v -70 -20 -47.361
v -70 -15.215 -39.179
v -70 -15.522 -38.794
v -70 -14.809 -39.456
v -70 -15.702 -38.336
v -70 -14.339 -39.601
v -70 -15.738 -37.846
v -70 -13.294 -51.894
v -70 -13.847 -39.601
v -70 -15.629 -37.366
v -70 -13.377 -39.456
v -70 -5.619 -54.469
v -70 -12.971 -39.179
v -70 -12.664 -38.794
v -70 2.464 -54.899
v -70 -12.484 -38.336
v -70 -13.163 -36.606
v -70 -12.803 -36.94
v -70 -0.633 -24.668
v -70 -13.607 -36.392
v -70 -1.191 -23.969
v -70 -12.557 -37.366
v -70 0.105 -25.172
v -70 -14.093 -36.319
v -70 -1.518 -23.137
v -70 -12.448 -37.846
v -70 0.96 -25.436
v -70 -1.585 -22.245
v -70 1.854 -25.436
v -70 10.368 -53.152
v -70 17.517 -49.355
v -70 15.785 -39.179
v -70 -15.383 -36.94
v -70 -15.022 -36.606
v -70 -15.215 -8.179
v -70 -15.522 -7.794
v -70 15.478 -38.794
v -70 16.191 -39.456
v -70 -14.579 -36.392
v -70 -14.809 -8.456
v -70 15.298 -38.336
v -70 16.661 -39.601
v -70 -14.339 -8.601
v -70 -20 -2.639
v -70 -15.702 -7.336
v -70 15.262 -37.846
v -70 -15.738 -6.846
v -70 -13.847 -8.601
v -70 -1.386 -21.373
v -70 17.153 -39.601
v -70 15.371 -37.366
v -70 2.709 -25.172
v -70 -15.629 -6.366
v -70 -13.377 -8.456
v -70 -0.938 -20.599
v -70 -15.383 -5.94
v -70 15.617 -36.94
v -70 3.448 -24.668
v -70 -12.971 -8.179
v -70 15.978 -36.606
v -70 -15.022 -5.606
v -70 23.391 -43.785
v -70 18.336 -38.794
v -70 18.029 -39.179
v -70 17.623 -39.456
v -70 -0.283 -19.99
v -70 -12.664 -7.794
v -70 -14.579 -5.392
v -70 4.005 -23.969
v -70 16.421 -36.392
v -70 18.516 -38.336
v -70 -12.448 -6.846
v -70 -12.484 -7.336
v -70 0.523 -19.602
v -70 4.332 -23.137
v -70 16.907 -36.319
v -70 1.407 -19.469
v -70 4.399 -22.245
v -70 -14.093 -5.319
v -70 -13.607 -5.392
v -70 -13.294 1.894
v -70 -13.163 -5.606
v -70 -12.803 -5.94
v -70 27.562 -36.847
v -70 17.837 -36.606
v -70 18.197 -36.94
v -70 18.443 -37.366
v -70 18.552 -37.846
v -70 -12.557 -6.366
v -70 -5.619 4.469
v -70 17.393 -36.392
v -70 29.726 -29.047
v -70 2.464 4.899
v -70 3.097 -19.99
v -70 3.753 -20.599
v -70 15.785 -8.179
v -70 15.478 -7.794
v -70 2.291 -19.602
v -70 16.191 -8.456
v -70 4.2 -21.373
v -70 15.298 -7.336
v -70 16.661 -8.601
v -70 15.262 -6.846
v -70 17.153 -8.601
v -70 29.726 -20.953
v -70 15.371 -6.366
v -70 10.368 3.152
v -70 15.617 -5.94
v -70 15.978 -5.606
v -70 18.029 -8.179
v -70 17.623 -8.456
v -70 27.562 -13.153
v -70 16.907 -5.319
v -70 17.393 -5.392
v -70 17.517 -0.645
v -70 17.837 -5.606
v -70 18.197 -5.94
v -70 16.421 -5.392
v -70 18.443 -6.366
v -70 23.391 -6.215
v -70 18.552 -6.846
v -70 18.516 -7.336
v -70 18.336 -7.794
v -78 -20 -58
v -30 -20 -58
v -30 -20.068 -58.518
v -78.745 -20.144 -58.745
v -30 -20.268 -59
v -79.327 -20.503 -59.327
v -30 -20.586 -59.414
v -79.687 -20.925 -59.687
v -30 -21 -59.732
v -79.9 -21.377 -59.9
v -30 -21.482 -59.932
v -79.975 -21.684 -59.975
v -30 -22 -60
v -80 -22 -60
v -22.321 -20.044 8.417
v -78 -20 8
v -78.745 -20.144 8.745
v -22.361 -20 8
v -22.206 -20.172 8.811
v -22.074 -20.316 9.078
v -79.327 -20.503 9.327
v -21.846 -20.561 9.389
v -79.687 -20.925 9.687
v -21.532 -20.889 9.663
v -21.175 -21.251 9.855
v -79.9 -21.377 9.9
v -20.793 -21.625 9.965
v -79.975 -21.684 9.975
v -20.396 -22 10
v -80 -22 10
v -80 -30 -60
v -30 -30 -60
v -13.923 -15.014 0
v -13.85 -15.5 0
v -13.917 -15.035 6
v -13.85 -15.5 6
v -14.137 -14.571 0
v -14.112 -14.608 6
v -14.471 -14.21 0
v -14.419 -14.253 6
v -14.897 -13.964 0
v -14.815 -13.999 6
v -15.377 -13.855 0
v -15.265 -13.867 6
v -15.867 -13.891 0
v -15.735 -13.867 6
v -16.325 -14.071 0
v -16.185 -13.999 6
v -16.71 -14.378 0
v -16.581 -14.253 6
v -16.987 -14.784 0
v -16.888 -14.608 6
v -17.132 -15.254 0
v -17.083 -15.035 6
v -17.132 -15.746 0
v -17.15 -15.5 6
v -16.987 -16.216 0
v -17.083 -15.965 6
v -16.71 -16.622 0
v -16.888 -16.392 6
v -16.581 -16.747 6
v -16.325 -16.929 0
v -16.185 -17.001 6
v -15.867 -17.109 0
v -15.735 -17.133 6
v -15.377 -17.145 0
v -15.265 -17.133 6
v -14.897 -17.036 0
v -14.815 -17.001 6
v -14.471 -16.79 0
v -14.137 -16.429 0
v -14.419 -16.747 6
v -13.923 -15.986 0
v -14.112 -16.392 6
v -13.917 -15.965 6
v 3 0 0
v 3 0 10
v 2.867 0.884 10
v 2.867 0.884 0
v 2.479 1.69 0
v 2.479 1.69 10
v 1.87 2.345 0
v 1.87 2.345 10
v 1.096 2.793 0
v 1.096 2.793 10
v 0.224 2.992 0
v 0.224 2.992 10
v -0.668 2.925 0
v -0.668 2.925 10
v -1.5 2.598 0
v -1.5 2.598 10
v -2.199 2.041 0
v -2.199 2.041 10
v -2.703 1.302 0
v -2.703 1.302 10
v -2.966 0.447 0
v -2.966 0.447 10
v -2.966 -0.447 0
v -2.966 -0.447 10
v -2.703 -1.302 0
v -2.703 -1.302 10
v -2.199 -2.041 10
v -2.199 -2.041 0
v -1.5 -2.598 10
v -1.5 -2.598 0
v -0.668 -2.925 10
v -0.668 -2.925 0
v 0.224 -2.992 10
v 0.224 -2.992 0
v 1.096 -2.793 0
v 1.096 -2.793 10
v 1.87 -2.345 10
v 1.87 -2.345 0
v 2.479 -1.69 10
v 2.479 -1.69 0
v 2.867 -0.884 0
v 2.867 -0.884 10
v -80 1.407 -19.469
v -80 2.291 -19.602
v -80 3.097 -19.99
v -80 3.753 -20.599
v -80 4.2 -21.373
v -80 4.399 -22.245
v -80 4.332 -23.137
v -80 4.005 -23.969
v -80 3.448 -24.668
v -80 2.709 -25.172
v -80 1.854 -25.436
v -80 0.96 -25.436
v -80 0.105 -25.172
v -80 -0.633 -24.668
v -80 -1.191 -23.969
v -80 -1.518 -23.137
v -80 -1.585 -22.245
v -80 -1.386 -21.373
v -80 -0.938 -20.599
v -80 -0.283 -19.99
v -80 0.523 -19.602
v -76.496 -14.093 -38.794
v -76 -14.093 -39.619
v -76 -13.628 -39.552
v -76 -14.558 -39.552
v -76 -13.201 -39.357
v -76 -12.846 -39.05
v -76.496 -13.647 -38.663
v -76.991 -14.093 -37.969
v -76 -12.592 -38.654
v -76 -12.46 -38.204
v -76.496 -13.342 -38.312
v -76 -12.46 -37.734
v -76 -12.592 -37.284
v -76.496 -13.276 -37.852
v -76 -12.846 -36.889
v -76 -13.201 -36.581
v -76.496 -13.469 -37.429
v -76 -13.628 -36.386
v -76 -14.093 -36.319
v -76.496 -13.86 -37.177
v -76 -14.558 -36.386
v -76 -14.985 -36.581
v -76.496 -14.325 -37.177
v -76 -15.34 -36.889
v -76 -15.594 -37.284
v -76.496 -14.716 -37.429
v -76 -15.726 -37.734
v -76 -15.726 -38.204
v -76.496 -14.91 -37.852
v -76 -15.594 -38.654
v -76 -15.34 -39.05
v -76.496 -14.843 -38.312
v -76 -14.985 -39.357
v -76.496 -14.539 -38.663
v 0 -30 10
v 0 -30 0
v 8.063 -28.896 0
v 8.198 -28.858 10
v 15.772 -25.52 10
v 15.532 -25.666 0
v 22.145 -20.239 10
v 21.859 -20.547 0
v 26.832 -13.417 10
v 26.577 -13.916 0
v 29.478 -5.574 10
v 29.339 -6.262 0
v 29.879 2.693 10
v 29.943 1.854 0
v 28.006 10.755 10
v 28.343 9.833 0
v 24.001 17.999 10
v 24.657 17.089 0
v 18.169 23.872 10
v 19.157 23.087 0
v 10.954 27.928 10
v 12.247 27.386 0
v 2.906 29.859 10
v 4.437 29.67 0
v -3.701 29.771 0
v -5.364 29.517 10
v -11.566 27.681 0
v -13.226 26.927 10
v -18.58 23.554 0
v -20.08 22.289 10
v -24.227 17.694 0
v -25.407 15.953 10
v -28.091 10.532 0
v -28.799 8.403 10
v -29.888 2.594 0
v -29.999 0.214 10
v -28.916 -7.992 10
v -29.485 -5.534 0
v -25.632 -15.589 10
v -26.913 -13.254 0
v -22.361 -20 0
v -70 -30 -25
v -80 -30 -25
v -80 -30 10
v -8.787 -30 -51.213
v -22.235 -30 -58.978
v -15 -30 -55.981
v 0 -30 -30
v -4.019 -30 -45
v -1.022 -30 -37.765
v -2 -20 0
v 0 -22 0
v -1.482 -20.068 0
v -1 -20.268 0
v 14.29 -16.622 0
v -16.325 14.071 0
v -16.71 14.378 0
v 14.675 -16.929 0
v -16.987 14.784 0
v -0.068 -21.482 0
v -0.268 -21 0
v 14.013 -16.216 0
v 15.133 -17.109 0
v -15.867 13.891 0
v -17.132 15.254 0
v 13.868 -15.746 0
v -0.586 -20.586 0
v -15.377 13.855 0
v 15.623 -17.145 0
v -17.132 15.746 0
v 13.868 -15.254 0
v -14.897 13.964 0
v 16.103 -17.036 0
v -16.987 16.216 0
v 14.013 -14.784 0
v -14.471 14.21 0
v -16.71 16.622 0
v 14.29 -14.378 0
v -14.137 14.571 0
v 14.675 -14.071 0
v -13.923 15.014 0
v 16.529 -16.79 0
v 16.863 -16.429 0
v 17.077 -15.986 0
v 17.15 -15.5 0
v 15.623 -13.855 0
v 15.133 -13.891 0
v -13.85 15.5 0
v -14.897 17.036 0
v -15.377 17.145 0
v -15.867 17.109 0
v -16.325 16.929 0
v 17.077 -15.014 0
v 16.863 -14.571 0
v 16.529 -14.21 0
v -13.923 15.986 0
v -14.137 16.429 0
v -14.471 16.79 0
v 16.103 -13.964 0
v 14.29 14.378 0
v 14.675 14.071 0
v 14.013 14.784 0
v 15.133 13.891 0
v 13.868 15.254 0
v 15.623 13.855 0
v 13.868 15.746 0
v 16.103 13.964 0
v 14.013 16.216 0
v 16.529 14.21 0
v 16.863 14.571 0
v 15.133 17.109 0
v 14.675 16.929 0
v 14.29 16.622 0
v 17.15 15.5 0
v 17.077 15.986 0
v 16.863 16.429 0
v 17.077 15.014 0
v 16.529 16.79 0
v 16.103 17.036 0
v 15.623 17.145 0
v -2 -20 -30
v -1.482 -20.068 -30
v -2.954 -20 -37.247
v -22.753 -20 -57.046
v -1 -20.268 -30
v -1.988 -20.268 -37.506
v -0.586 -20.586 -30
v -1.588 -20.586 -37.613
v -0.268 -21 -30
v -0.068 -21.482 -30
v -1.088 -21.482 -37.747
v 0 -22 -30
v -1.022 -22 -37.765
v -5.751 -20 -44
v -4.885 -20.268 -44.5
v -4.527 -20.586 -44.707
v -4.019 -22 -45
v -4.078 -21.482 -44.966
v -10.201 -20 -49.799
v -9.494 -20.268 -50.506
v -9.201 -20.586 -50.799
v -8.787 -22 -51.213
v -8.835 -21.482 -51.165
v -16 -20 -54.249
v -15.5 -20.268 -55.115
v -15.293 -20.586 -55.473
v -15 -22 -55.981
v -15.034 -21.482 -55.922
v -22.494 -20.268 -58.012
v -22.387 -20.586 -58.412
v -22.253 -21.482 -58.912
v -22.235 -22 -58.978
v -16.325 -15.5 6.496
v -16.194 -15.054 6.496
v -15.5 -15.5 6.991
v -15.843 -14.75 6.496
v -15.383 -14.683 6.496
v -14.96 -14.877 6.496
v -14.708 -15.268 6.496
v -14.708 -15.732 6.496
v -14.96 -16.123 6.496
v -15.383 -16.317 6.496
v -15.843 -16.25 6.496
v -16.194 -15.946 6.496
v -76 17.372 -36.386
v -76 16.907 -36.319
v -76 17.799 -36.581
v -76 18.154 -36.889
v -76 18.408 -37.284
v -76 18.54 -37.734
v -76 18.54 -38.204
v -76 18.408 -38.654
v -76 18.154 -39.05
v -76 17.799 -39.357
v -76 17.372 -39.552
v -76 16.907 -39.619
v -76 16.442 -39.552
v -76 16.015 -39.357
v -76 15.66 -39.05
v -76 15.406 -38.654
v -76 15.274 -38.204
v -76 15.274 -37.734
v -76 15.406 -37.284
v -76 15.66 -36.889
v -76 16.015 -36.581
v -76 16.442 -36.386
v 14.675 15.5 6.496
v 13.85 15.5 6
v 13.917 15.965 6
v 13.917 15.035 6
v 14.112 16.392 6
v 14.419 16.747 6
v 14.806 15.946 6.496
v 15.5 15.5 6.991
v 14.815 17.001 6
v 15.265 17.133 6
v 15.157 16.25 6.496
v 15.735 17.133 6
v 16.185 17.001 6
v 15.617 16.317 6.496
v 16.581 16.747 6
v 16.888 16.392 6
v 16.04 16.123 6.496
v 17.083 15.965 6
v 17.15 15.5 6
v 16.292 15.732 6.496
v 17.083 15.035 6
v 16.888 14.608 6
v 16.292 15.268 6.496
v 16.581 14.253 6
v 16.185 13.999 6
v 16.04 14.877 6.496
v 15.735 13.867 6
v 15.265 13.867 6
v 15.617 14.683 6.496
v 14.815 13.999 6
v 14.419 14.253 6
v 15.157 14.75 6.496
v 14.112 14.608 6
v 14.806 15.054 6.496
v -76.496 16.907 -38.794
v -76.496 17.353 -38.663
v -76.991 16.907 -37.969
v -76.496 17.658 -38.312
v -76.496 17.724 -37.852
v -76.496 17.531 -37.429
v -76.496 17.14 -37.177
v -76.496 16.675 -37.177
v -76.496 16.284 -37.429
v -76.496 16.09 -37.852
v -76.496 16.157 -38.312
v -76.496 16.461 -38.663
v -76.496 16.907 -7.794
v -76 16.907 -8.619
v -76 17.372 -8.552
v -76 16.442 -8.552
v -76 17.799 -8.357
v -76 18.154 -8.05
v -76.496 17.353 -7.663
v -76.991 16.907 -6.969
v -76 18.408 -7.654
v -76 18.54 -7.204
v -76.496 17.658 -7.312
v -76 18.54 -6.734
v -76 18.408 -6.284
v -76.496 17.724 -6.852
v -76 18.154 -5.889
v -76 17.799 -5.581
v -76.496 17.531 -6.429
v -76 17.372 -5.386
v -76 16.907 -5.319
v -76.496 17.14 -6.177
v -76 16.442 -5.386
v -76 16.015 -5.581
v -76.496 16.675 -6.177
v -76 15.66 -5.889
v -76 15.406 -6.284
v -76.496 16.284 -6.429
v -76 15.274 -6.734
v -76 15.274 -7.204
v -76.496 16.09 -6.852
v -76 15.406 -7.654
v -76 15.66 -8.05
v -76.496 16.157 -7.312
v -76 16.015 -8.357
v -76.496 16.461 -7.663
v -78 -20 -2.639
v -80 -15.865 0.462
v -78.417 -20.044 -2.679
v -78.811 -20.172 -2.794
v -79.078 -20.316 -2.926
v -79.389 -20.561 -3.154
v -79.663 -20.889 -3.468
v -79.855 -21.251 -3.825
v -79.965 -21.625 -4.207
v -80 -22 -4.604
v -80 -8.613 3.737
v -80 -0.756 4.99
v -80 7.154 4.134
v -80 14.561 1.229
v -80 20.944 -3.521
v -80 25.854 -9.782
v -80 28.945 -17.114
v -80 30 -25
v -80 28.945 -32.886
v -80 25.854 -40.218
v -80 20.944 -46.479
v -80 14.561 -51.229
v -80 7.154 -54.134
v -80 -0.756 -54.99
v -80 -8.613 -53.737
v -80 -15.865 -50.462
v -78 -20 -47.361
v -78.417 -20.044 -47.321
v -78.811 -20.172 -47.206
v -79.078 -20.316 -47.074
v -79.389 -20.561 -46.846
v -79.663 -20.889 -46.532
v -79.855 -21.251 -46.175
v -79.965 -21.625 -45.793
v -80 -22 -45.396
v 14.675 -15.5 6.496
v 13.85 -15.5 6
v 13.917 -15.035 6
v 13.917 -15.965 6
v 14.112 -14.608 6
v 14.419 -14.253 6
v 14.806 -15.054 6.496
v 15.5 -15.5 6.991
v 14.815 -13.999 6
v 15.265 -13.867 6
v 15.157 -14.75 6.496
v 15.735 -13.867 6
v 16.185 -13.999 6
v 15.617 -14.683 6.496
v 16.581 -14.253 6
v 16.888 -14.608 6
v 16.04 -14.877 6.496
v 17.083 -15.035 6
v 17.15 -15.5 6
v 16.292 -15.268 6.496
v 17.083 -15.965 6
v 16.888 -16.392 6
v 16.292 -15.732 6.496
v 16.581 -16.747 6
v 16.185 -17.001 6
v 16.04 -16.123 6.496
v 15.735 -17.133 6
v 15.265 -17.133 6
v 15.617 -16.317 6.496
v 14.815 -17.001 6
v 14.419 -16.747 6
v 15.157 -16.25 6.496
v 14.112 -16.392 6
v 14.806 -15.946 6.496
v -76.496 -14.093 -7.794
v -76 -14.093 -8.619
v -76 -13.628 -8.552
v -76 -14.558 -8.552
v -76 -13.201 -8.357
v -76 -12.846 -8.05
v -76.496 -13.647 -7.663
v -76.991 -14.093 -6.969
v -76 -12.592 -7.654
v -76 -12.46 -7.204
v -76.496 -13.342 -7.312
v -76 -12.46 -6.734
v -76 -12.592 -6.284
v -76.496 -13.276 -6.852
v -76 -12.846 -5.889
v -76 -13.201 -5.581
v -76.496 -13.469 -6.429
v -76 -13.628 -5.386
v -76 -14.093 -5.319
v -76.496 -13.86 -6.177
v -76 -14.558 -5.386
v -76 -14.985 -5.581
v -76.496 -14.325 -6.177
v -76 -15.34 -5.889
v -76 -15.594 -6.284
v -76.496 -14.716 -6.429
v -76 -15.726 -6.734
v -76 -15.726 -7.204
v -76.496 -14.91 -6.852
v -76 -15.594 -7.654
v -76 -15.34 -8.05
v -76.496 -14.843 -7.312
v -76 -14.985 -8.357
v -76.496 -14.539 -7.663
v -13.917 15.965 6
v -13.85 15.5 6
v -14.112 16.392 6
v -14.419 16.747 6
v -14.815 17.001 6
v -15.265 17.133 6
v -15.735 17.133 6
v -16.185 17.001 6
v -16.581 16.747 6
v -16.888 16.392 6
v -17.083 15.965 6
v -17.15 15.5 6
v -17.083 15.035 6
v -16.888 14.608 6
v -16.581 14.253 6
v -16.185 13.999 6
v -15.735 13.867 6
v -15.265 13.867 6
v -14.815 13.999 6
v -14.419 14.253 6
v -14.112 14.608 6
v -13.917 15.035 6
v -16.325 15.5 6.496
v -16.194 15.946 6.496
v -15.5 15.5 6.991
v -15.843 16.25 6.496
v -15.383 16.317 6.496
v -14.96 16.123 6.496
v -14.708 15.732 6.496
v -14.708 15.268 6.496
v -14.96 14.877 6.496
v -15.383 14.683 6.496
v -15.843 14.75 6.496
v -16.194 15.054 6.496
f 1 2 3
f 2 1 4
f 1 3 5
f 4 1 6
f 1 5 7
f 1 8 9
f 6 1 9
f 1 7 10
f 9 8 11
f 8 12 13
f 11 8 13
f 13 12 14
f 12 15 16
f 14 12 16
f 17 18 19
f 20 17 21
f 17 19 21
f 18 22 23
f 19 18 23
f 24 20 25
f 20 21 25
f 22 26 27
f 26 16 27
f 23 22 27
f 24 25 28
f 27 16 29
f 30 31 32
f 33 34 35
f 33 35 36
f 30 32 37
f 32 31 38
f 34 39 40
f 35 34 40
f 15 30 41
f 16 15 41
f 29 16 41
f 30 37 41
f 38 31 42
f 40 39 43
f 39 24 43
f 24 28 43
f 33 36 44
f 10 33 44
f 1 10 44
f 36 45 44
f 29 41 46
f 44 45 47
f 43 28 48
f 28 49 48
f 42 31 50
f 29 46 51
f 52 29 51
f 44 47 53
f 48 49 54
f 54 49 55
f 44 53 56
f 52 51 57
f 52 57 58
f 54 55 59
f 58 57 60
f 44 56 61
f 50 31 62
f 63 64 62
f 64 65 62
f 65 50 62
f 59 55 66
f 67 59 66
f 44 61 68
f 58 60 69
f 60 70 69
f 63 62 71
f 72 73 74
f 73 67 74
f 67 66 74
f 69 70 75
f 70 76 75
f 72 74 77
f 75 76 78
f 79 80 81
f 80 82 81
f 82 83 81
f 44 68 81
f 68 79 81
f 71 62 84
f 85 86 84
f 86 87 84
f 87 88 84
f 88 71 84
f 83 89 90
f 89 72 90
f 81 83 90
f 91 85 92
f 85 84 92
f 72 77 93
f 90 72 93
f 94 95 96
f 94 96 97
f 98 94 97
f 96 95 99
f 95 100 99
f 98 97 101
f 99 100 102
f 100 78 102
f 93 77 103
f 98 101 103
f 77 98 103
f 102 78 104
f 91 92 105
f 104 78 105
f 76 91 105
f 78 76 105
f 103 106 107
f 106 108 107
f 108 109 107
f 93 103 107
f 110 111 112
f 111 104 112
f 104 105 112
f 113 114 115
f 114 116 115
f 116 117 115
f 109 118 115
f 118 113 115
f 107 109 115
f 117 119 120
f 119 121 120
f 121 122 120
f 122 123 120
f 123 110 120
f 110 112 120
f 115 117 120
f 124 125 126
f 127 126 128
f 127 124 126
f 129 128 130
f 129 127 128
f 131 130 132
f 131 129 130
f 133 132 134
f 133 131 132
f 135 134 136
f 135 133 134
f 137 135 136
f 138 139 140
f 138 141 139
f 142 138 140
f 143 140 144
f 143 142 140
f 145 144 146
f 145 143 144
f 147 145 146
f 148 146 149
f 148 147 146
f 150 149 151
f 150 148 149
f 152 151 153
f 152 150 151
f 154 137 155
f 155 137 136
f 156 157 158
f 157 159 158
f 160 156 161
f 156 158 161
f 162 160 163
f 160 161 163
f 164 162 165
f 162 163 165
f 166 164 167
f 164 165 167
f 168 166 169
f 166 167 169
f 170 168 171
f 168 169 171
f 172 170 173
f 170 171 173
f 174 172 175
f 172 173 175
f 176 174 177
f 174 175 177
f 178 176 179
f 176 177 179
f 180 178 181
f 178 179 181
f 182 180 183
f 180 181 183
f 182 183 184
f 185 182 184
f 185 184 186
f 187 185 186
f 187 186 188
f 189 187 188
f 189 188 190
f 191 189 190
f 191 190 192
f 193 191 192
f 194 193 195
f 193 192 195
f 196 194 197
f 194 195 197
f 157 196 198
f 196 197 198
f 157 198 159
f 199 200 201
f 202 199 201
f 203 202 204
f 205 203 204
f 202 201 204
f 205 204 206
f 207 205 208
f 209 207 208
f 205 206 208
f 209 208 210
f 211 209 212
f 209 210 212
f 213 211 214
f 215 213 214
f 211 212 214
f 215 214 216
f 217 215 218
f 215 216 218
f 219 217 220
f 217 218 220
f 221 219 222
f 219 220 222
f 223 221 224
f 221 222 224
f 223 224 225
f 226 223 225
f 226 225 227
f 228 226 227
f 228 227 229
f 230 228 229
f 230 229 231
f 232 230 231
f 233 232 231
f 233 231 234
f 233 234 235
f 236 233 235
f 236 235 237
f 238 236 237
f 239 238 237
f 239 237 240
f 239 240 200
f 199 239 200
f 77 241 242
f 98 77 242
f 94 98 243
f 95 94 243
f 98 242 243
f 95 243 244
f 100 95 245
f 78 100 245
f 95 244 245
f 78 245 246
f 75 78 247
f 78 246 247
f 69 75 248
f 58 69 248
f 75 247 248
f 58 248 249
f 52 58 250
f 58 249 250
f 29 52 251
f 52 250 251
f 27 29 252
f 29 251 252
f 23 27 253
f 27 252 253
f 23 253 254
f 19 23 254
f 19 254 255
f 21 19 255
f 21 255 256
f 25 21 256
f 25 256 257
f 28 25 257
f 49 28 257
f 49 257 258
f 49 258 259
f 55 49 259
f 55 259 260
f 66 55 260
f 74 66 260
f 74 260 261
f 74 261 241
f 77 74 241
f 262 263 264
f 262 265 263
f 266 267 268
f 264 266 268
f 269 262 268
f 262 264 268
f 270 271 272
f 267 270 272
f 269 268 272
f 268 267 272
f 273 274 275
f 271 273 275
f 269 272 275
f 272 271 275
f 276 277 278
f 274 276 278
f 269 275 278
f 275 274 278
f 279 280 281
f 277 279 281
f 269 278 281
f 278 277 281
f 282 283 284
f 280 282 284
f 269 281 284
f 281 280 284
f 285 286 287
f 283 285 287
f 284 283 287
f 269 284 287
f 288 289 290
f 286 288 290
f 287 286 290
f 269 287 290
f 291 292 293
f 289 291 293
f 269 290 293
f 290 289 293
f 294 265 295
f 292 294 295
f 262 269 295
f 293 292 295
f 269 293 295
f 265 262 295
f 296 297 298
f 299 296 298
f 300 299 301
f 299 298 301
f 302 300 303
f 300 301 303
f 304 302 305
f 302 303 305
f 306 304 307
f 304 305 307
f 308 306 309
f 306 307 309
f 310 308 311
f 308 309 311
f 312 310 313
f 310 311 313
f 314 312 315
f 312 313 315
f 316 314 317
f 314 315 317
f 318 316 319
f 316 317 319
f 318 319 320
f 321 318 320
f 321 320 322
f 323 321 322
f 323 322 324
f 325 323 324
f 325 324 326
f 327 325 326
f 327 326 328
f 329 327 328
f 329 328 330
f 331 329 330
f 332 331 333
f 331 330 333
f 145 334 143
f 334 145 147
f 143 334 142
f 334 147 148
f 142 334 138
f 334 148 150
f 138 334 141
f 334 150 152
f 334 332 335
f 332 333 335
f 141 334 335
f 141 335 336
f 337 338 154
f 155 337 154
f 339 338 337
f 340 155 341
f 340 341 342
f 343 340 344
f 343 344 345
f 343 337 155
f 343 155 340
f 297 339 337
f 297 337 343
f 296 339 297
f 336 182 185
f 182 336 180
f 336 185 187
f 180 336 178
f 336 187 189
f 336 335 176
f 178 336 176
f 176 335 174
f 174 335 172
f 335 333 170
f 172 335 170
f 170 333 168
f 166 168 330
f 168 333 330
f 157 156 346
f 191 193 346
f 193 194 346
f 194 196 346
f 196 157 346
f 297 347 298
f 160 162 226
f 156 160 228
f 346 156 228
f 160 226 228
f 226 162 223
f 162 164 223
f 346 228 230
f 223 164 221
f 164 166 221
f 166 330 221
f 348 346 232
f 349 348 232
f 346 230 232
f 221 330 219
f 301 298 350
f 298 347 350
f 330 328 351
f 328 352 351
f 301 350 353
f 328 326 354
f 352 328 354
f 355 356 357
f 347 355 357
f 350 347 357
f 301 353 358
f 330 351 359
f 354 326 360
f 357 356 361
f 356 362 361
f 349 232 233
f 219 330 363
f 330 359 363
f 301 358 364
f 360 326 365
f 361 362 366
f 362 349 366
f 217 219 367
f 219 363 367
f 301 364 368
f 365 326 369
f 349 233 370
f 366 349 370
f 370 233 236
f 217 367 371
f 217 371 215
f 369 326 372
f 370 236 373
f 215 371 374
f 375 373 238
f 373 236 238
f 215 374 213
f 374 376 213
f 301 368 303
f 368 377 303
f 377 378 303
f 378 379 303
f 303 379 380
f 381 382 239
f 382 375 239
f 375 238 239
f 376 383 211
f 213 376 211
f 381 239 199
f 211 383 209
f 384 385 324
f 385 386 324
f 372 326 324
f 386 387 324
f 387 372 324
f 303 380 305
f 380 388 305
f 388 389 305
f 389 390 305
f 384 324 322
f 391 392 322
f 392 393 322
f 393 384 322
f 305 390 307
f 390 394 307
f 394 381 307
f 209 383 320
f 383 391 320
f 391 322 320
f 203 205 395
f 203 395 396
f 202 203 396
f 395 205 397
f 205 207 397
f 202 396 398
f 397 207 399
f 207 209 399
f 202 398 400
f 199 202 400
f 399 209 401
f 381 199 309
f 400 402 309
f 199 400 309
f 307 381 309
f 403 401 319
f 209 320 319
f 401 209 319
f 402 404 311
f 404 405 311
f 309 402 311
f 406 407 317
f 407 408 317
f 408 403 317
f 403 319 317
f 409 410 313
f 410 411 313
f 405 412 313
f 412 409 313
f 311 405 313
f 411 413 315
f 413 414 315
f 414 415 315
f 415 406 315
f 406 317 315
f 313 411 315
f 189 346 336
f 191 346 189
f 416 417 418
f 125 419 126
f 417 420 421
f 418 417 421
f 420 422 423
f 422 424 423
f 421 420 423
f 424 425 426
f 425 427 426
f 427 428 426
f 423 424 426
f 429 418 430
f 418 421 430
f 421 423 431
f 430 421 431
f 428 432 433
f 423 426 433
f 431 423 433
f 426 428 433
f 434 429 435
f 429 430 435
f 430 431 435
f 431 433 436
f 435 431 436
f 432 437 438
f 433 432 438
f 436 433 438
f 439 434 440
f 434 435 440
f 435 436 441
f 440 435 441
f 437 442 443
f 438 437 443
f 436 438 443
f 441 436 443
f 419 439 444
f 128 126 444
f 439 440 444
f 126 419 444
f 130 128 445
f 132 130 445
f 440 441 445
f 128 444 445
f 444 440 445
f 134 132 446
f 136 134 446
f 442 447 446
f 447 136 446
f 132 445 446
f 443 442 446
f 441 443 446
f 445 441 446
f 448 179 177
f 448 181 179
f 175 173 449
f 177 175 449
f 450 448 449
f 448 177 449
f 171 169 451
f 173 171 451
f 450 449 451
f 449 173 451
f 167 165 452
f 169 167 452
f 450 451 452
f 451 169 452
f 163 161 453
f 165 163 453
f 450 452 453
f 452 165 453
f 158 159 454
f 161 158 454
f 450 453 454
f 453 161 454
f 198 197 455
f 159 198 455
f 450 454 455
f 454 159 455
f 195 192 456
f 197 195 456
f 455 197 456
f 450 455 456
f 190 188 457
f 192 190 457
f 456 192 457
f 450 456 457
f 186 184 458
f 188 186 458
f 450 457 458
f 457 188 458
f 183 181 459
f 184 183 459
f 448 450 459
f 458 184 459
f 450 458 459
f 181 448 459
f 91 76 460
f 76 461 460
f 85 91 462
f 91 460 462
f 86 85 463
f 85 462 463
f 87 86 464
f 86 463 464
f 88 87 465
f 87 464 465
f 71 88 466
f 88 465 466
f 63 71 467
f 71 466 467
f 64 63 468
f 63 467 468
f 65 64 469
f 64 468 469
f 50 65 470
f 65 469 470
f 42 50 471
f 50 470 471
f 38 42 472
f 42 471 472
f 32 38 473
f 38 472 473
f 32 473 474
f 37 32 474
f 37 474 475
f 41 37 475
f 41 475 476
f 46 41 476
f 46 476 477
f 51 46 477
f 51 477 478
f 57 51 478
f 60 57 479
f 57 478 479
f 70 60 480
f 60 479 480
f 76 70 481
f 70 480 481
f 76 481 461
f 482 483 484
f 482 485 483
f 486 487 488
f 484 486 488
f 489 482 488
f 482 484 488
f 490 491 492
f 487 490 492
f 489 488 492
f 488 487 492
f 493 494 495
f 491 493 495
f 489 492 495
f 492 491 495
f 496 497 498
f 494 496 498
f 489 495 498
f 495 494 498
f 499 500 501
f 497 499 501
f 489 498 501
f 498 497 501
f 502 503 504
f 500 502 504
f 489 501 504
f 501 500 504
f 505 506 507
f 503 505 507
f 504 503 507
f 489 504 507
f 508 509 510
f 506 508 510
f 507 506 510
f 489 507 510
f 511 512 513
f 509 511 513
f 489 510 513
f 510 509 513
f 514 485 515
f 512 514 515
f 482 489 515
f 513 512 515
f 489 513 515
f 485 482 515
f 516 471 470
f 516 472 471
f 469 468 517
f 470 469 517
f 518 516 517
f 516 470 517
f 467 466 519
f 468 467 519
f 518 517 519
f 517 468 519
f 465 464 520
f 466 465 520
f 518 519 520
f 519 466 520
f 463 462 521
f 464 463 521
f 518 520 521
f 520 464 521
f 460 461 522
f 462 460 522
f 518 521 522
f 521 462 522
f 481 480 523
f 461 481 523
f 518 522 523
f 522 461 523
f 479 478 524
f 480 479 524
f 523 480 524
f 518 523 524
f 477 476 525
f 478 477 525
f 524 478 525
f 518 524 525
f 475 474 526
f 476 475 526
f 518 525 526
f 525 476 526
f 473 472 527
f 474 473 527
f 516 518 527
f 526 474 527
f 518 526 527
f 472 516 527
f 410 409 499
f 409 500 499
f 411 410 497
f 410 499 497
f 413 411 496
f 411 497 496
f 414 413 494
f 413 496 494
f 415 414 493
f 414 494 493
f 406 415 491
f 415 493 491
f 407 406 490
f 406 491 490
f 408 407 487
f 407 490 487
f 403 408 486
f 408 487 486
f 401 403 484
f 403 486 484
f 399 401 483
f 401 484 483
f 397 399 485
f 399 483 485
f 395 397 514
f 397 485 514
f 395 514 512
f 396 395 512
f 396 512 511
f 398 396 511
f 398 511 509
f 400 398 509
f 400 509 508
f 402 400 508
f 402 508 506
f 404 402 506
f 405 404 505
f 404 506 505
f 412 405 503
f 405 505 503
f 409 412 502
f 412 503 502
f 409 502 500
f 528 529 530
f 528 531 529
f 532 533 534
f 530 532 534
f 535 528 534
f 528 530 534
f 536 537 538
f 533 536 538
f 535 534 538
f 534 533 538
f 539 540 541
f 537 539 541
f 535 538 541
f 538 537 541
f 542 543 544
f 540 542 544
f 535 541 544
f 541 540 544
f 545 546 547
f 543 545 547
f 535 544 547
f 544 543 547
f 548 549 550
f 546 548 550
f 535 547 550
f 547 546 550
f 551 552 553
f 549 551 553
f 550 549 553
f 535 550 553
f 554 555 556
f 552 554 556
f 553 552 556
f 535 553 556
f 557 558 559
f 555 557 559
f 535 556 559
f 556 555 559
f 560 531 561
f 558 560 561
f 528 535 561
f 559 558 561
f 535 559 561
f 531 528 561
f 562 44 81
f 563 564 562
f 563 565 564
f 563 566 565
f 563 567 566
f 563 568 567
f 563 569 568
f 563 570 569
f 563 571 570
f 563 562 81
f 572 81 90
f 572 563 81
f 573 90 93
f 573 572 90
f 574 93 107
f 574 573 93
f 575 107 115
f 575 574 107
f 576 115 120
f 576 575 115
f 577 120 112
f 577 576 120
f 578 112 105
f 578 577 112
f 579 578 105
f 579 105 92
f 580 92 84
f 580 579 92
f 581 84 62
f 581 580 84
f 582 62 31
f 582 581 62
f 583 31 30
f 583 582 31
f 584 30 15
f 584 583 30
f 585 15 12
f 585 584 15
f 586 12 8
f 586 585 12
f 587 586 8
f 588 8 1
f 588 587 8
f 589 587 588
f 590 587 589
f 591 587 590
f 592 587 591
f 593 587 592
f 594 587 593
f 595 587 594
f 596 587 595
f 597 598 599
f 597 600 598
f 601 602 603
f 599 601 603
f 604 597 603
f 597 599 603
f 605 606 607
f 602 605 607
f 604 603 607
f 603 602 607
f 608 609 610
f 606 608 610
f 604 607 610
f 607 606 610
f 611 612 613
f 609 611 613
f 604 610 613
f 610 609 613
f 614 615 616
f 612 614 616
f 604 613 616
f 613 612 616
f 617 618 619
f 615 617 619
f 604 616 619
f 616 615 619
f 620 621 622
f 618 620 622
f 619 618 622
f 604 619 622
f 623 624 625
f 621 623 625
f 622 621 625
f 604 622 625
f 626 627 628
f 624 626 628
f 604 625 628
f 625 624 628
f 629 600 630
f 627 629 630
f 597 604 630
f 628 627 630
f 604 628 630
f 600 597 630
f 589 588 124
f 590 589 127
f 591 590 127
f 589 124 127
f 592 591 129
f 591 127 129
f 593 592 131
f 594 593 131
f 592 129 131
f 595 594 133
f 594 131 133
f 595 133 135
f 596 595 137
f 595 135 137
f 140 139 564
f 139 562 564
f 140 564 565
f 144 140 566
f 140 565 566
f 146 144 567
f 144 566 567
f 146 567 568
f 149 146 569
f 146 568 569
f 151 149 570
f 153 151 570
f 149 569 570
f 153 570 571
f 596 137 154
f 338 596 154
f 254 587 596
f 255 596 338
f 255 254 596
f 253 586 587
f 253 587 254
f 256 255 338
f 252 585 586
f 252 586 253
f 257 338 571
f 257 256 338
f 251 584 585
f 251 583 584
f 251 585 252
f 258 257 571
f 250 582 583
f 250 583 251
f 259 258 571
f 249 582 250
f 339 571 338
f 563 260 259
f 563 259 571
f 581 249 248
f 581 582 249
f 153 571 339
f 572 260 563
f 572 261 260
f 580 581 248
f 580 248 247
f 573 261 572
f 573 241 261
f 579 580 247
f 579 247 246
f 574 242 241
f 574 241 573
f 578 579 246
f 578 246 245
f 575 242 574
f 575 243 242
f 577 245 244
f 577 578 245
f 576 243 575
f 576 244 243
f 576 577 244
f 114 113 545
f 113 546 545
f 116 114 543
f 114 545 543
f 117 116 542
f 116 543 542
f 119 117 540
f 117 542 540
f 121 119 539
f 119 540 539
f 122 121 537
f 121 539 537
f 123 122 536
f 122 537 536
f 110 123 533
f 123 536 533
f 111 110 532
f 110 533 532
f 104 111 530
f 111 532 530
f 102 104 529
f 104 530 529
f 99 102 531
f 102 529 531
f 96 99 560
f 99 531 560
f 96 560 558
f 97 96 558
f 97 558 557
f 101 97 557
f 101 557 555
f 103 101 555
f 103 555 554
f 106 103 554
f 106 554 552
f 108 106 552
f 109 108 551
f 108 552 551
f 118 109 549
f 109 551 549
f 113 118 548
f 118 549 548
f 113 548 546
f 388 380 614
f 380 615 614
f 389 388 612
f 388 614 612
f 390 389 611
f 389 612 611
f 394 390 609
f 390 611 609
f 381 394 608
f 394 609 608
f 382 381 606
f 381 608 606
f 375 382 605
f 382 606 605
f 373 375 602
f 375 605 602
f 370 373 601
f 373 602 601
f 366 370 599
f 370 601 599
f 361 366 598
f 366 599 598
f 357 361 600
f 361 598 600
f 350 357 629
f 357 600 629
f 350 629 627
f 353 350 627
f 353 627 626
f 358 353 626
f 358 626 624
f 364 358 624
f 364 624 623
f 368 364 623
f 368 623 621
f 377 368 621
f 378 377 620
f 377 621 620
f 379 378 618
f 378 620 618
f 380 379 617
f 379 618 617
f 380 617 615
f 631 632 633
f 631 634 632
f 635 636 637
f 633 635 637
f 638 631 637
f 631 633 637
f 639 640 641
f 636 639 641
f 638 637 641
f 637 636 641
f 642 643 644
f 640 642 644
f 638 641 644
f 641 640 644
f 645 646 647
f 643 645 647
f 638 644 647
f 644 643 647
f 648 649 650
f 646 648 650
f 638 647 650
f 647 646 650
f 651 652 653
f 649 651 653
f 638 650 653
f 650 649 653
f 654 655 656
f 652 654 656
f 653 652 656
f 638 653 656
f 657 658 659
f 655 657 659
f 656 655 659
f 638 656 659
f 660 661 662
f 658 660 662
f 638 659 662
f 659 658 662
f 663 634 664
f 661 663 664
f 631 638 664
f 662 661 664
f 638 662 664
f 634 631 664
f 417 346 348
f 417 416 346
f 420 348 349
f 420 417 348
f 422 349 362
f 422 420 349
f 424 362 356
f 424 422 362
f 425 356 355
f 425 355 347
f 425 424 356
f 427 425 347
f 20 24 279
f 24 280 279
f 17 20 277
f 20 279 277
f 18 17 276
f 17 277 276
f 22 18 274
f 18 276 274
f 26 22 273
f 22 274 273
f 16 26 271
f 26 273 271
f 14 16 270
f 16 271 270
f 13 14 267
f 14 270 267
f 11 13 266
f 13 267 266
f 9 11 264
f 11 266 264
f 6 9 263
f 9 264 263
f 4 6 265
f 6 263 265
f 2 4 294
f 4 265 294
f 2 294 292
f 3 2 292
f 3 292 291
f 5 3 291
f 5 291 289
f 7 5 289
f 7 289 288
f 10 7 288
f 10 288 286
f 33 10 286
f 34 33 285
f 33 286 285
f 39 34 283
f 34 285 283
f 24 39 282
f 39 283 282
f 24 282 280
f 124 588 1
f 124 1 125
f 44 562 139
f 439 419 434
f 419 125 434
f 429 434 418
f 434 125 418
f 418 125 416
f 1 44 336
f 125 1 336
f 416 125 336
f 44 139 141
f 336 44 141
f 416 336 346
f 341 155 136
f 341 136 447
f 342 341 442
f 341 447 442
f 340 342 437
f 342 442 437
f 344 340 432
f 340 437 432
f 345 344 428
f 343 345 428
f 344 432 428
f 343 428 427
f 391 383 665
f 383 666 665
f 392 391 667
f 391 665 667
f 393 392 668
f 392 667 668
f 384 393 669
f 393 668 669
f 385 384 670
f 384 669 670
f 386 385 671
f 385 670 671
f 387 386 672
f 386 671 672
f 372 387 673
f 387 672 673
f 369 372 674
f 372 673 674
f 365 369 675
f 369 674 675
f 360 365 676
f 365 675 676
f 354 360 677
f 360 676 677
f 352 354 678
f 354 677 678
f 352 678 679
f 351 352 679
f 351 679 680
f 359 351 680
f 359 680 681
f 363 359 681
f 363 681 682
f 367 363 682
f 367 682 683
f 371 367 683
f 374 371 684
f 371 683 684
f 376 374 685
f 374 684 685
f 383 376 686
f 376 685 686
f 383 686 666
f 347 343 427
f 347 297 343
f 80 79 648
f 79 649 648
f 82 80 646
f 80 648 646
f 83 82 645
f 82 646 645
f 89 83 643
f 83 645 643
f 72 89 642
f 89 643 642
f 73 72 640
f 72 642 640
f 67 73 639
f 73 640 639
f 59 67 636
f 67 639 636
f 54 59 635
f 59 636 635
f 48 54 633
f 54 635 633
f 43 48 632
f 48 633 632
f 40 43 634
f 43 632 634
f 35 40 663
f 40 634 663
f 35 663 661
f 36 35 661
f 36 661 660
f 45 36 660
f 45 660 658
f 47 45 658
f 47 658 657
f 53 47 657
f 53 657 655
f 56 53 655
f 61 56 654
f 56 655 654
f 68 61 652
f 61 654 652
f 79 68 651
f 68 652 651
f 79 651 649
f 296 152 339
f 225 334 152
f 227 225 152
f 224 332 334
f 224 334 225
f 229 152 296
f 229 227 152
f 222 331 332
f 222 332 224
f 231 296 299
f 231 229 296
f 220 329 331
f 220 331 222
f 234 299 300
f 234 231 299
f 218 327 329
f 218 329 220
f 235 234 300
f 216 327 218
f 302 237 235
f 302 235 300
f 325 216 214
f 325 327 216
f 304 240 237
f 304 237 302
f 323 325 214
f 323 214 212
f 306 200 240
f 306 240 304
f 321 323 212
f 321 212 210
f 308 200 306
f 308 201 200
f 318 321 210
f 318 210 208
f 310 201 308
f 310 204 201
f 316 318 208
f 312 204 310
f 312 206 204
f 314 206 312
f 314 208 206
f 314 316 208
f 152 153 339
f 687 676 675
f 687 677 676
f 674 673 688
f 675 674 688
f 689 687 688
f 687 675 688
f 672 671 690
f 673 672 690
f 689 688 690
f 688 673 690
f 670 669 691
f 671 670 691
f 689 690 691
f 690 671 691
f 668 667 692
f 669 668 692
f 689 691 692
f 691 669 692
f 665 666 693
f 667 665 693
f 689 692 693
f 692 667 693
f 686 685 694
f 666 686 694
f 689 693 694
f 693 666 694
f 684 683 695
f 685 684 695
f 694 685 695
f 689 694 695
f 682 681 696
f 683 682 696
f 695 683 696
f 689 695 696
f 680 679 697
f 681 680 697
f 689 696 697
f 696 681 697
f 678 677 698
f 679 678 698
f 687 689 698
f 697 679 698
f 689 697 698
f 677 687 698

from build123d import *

# Parameters (mm, degrees)
SKETCH1_R                 = 30
BOSS_EXTRUDE1_DEPTH       = 10
SKETCH2_W                 = 80
SKETCH2_H                 = 10
BOSS_EXTRUDE2_DEPTH       = 70
SKETCH3_R                 = 30
BOSS_EXTRUDE3_DEPTH       = 10
F_6_0MM_DOWEL_HOLE2_D     = 6
M4X0_7_TAPPED_HOLE2_D     = 3.3
M4X0_7_TAPPED_HOLE2_DEPTH = 6
M4X0_7_TAPPED_HOLE2_TIP   = 0.991420021
F_6_0MM_DOWEL_HOLE4_D     = 6
M4X0_7_TAPPED_HOLE4_D     = 3.3
M4X0_7_TAPPED_HOLE4_DEPTH = 6
M4X0_7_TAPPED_HOLE4_TIP   = 0.991420021
FILLET1_R                 = 30
FILLET2_R                 = 2


with BuildPart() as part:
    # Sketch1 → Boss-Extrude1 (new body)
    with BuildSketch(Plane.XY):
        Circle(SKETCH1_R)
    extrude(amount=BOSS_EXTRUDE1_DEPTH)

    # Sketch2 → Boss-Extrude2 (add)
    with BuildSketch(Plane.XY.offset(10)):
        with Locations((-40, -25)):
            Rectangle(SKETCH2_W, SKETCH2_H)
    extrude(amount=-BOSS_EXTRUDE2_DEPTH)

    # Sketch3 → Boss-Extrude3 (add)
    with BuildSketch(Plane.ZY.offset(80)):
        with Locations((-25, 0)):
            Circle(SKETCH3_R)
    extrude(amount=-BOSS_EXTRUDE3_DEPTH)

    # Ø6.0mm Dowel Hole2 (through all)
    with Locations(Plane(origin=(0, 0, 0), x_dir=(-1, 0, 0), z_dir=(0, 0, -1))):
        with Locations((0, 0)):
            Hole(F_6_0MM_DOWEL_HOLE2_D / 2)

    # M4x0.7 Tapped Hole2
    with Locations(Plane(origin=(0, 0, 0), x_dir=(-1, 0, 0), z_dir=(0, 0, -1))):
        with Locations((-15.5, 15.5), (15.5, 15.5), (15.5, -15.5), (-15.5, -15.5)):
            Hole(M4X0_7_TAPPED_HOLE2_D / 2, depth=M4X0_7_TAPPED_HOLE2_DEPTH)
            with Locations((0, 0, -(M4X0_7_TAPPED_HOLE2_DEPTH + M4X0_7_TAPPED_HOLE2_TIP / 2))):  # 118° drill point
                Cone(0, M4X0_7_TAPPED_HOLE2_D / 2, M4X0_7_TAPPED_HOLE2_TIP, mode=Mode.SUBTRACT)

    # Ø6.0mm Dowel Hole4 (through all)
    with Locations(Plane(origin=(-70, 1.407077757, -22.469041667), x_dir=(0, 0, -1), z_dir=(1, 0, 0))):
        with Locations((0, 0)):
            Hole(F_6_0MM_DOWEL_HOLE4_D / 2)

    # M4x0.7 Tapped Hole4
    with Locations(Plane(origin=(-70, 1.407077757, -22.469041667), x_dir=(0, 0, -1), z_dir=(1, 0, 0))):
        with Locations((-15.5, 15.5), (15.5, 15.5), (15.5, -15.5), (-15.5, -15.5)):
            Hole(M4X0_7_TAPPED_HOLE4_D / 2, depth=M4X0_7_TAPPED_HOLE4_DEPTH)
            with Locations((0, 0, -(M4X0_7_TAPPED_HOLE4_DEPTH + M4X0_7_TAPPED_HOLE4_TIP / 2))):  # 118° drill point
                Cone(0, M4X0_7_TAPPED_HOLE4_D / 2, M4X0_7_TAPPED_HOLE4_TIP, mode=Mode.SUBTRACT)

    # Fillet1
    fillet1_edges = [part.edges().sort_by_distance(p)[0] for p in [
        (0, -25, -60),
    ]]
    fillet(fillet1_edges, radius=FILLET1_R)

    # Fillet2
    fillet2_edges = [part.edges().sort_by_distance(p)[0] for p in [
        (-80, -20, -53.680339887),
        (-51.180339887, -20, 10),
        (-80, -20, 3.680339887),
        (0, -20, -15),
        (-55, -20, -60),
        (-8.786796564, -20, -51.213203436),
    ]]
    fillet(fillet2_edges, radius=FILLET2_R)


solid = part.part
